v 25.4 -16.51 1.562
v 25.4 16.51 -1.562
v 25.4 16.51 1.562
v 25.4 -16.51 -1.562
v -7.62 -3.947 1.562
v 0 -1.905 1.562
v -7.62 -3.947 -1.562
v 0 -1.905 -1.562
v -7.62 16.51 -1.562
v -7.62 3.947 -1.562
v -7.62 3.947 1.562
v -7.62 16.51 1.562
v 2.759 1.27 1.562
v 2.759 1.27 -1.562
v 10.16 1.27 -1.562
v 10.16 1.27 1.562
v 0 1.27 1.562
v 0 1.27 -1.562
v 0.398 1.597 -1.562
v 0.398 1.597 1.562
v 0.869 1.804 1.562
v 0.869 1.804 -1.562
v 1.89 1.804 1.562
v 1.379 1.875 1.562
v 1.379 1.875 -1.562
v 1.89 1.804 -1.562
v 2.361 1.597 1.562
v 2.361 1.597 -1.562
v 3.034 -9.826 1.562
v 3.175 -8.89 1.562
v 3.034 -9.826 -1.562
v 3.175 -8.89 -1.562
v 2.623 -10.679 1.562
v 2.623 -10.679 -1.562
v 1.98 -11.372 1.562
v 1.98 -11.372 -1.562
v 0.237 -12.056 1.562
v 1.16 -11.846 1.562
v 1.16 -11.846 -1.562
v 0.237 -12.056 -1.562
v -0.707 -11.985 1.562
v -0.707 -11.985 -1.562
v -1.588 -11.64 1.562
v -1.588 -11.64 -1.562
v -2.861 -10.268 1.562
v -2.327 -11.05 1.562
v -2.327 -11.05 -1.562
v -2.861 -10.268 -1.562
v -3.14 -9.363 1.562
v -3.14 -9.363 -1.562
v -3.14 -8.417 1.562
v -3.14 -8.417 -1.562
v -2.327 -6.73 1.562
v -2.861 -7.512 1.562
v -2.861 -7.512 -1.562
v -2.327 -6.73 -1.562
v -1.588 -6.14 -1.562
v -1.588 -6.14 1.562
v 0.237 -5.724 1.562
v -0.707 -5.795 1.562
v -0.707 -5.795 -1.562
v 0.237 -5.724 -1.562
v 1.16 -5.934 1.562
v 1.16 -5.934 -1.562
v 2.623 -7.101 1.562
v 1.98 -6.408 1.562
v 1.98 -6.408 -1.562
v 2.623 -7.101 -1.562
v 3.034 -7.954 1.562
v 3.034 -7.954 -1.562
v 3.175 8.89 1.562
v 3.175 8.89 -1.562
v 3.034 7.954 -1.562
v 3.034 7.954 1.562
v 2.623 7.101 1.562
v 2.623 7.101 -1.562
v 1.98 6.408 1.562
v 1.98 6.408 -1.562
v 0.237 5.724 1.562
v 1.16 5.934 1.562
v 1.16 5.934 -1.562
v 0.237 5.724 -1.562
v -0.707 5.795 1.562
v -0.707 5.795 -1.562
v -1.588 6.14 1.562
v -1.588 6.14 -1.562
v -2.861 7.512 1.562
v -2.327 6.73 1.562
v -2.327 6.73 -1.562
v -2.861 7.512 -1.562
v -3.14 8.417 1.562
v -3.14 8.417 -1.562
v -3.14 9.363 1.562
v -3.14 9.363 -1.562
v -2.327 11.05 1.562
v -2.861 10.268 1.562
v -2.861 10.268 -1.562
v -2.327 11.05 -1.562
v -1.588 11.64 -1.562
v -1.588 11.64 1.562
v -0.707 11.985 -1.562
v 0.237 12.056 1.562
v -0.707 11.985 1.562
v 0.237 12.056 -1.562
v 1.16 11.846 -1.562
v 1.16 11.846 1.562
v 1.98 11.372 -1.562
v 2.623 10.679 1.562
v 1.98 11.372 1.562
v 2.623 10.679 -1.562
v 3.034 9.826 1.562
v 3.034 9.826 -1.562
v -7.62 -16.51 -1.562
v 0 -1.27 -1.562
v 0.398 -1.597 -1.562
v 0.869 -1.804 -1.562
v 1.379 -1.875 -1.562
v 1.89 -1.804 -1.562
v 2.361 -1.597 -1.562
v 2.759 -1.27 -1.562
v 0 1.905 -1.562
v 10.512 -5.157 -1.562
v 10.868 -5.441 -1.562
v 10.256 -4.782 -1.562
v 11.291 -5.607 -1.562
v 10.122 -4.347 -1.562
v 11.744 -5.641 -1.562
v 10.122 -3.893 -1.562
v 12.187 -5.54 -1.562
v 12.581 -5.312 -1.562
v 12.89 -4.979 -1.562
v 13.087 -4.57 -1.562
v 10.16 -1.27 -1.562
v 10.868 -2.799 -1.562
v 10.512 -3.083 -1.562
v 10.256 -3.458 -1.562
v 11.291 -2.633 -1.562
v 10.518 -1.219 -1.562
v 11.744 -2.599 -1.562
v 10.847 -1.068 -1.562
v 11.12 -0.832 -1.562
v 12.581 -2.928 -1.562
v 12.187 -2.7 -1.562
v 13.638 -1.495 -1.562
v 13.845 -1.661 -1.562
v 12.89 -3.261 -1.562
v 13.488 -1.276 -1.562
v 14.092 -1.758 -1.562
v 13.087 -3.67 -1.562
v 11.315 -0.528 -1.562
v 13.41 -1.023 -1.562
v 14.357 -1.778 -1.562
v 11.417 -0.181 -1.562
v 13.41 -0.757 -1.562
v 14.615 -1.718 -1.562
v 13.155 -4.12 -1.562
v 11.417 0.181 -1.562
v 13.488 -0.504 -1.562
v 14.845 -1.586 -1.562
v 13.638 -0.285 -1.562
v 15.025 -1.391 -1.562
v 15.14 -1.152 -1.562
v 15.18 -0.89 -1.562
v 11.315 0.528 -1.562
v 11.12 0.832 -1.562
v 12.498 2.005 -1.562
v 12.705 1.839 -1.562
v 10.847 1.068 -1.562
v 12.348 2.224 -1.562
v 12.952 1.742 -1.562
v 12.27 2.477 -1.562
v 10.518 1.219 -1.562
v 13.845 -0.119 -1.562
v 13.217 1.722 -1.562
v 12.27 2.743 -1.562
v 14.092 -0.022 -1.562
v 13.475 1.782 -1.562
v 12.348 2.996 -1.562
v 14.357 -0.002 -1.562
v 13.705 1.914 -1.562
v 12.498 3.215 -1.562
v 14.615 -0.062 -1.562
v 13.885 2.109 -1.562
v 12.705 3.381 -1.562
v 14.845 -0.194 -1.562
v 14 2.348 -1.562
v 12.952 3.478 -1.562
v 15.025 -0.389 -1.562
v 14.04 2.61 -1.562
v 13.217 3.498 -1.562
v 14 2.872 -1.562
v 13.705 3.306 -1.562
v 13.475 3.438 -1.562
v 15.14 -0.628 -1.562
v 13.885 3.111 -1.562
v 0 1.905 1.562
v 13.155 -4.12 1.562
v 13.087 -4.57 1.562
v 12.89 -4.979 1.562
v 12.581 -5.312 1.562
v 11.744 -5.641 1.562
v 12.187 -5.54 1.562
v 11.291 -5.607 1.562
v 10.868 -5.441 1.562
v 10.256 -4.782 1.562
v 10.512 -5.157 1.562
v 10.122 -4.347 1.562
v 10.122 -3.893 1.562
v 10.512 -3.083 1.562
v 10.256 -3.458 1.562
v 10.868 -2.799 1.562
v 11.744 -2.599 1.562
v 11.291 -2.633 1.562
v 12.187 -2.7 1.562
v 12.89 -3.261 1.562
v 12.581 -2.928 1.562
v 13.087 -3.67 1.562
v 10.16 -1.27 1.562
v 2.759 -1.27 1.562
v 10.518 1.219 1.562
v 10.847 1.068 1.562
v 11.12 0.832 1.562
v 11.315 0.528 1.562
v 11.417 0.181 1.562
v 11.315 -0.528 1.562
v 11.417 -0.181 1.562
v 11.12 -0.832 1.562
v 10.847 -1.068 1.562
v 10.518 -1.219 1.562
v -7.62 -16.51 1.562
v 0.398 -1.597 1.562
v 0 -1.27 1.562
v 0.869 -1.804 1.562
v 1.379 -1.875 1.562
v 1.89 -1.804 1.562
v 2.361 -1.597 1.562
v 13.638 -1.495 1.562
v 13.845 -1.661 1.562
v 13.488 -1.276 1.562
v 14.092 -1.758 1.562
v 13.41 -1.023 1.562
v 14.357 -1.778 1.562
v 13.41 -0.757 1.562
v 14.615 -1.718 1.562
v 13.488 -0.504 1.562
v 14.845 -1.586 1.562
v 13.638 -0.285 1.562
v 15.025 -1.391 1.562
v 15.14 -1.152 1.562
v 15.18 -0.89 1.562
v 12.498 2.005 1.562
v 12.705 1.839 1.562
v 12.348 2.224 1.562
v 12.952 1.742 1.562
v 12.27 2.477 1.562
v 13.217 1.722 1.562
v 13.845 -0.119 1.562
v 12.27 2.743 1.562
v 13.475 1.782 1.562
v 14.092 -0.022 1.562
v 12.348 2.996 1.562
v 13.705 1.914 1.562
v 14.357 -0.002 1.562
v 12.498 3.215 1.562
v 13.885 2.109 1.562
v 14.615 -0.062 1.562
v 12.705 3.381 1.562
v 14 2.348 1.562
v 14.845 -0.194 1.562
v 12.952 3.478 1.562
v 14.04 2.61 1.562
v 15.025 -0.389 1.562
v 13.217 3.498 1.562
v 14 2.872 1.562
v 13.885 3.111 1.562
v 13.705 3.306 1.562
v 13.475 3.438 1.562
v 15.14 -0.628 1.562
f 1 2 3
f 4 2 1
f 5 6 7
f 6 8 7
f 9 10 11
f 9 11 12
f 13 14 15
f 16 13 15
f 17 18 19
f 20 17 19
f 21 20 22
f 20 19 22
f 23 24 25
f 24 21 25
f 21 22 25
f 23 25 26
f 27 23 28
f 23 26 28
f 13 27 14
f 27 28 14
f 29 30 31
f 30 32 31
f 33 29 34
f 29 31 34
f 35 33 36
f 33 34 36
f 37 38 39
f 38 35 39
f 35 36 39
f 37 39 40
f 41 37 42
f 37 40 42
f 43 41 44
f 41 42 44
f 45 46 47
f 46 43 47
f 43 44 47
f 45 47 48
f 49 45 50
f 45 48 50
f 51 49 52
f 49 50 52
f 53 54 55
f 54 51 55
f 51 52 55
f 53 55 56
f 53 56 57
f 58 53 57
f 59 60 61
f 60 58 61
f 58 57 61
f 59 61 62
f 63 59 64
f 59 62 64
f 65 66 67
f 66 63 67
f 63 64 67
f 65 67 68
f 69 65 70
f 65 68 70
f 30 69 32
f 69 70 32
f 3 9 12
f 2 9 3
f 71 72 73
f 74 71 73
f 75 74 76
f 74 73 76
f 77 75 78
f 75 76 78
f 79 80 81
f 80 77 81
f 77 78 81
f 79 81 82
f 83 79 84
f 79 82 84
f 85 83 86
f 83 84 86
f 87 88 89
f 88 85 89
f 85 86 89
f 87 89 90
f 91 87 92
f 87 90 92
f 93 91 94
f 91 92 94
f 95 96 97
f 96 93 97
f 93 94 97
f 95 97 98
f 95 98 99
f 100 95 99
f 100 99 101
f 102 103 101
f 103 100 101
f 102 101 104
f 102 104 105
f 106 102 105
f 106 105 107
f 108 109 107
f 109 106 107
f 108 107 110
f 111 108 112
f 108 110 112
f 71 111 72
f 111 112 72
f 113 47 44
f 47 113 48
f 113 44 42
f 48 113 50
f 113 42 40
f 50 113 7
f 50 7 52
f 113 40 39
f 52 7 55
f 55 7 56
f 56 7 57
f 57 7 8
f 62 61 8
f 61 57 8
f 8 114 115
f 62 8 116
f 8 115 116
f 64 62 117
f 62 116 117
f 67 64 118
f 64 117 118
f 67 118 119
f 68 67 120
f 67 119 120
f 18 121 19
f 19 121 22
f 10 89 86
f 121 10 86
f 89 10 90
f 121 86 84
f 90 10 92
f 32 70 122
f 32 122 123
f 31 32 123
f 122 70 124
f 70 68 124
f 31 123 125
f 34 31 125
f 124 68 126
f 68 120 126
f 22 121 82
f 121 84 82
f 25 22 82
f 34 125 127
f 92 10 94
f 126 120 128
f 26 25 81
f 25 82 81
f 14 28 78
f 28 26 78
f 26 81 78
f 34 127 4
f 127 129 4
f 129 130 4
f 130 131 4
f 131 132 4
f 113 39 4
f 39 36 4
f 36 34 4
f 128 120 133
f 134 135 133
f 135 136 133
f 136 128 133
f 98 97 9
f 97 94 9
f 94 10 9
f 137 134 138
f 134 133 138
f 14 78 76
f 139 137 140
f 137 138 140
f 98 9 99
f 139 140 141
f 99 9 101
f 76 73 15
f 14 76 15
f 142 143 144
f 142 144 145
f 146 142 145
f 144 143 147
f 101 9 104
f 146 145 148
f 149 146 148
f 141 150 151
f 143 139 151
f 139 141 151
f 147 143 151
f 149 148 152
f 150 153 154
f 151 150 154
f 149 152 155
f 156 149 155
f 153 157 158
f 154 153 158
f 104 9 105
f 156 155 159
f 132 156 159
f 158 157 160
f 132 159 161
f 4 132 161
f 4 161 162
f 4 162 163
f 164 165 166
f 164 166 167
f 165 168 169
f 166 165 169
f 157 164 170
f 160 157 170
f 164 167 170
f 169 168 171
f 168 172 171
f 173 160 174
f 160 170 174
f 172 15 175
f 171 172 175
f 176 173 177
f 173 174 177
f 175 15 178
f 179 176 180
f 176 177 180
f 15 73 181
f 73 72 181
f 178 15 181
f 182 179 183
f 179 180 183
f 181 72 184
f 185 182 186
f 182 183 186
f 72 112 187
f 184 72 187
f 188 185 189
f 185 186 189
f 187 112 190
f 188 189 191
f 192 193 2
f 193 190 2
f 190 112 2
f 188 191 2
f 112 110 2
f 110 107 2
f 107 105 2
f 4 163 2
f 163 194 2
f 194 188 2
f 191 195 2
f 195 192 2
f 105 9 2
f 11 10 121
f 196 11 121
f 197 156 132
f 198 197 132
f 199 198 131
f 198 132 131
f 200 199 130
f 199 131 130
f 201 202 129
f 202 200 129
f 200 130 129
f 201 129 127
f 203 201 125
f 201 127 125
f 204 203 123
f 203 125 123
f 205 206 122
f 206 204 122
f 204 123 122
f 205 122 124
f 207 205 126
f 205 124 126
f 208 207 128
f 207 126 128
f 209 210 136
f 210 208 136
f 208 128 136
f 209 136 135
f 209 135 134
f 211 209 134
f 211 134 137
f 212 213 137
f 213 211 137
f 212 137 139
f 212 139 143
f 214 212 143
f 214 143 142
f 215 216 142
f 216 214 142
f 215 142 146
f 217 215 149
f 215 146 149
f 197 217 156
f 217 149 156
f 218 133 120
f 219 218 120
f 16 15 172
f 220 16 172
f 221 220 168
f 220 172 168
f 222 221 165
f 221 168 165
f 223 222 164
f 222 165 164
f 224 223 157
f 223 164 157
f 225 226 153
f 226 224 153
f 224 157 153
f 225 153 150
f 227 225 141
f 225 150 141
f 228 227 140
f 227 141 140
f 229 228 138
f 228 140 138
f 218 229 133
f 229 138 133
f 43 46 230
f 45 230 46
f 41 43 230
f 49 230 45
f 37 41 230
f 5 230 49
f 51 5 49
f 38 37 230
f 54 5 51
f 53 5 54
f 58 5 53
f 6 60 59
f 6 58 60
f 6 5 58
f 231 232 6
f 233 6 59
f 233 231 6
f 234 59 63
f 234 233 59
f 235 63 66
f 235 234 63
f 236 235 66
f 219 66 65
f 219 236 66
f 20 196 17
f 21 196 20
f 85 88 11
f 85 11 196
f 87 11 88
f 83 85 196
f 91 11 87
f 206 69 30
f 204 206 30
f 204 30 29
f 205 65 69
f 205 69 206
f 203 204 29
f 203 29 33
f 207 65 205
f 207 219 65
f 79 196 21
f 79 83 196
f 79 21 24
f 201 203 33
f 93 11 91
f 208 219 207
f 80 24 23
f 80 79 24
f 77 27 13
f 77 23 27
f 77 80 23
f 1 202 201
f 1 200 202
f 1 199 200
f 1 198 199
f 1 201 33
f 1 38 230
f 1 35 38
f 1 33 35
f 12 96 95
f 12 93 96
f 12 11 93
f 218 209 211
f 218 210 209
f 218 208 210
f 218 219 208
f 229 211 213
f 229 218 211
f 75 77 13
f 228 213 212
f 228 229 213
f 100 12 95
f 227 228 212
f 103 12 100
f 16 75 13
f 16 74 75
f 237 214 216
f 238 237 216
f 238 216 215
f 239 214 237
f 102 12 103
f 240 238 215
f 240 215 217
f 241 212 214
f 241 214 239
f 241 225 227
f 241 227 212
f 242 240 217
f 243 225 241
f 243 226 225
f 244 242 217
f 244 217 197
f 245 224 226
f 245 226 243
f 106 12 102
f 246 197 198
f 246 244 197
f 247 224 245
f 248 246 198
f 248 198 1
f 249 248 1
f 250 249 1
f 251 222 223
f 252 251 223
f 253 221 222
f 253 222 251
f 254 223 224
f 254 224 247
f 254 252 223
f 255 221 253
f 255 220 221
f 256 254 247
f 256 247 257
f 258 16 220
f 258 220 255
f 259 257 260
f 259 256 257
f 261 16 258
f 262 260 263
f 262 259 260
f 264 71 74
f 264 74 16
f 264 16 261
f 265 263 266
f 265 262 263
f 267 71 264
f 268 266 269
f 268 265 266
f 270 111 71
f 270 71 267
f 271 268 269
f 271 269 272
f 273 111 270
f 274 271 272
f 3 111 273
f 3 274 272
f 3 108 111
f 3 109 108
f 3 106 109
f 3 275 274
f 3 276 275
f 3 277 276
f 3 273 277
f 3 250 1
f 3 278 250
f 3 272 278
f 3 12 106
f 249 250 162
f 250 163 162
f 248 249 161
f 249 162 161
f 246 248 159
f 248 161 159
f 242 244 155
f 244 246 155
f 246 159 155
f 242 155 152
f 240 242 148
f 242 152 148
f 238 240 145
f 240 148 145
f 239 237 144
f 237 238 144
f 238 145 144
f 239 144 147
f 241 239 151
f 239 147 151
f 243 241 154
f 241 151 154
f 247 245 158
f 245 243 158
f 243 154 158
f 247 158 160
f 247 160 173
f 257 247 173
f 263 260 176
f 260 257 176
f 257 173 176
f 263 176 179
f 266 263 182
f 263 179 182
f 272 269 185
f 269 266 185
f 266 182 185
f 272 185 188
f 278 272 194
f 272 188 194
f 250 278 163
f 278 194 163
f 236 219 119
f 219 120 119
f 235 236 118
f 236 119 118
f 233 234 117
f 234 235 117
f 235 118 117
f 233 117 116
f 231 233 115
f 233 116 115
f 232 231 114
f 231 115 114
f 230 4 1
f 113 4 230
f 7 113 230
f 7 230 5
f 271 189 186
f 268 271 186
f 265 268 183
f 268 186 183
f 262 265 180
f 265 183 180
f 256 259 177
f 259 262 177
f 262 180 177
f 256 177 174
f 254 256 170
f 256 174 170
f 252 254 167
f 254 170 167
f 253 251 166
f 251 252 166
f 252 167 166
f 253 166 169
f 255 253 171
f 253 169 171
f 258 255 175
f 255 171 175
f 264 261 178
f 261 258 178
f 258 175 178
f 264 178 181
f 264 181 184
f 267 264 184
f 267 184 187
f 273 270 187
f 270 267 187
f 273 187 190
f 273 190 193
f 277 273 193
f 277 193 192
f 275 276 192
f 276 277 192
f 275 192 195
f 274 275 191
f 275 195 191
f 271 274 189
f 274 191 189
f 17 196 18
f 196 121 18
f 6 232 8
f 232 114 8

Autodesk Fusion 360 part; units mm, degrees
sketch "Sketch1" plane through (0, 0, 0) normal (0, 0, 1) x (1, 0, 0)
  line L0 (-7.62, 16.51) -> (25.4, 16.51)
  line L1 (25.4, 16.51) -> (25.4, -16.51)
  line L2 (25.4, -16.51) -> (-7.62, -16.51)
  circle A0 centre (0, 8.89) radius 3.175
  circle A1 centre (0, -8.89) radius 3.175
  circle A2 centre (13.15, 2.61) radius 0.89
  circle A3 centre (14.29, -0.89) radius 0.89
  circle A4 centre (11.63, -4.12) radius 1.525
  line L3 (-7.62, 3.9468) -> (0, 1.905)
  line L4 (2.7588, 1.27) -> (10.16, 1.27)
  arc A5 (10.16, -1.27) -> (10.16, 1.27) centre (10.16, 0) ccw
  line L5 (10.16, -1.27) -> (2.7588, -1.27)
  arc A6 (0, -1.27) -> (2.7588, -1.27) centre (1.3794, 0) ccw
  line L6 (0, -1.27) -> (0, -1.905)
  line L7 (0, -1.905) -> (-7.62, -3.9468)
  line L8 (-7.62, -16.51) -> (-7.62, -3.9468)
  line L9 (-7.62, 3.9468) -> (-7.62, 16.51)
  line L10 (0, 110) -> (0, -80) construction
  line L11 (11.43, -80) -> (11.43, 100) construction
  line L12 (-90, 0) -> (-86.3571, 0) construction
  line L13 (-86.3571, 0) -> (70, 0) construction
  line L14 (0, 1.905) -> (0, 1.27)
  arc A7 (2.7588, 1.27) -> (0, 1.27) centre (1.3794, 0) ccw
  dimension "d1" = 6.35
  dimension "d2" = 7.62
  dimension "d3" = 7.62
  dimension "d4" = 33.02
  dimension "d5" = 1.27
  dimension "d6" = 19.05
  dimension "d10" = 15
  dimension "d11" = 1.905
  dimension "d12" = 1.905
  dimension "d14" = 7.62
  dimension "d15" = 1.78
  dimension "d16" = 1.78
  dimension "d17" = 3.05
  dimension "d18" = 12.39
  dimension "d19" = 13.77
  dimension "d20" = 11.11
  dimension "d21" = 15.62
  dimension "d22" = 12.25
  dimension "d23" = 13.9
  dimension "d24" = 33.02
  dimension "d26" = 1.875
  dimension "d27" = 15
  dimension "d28" = 2.54
extrude "Extrude1" add sketch "Sketch1" along normal mid plane 3.124
